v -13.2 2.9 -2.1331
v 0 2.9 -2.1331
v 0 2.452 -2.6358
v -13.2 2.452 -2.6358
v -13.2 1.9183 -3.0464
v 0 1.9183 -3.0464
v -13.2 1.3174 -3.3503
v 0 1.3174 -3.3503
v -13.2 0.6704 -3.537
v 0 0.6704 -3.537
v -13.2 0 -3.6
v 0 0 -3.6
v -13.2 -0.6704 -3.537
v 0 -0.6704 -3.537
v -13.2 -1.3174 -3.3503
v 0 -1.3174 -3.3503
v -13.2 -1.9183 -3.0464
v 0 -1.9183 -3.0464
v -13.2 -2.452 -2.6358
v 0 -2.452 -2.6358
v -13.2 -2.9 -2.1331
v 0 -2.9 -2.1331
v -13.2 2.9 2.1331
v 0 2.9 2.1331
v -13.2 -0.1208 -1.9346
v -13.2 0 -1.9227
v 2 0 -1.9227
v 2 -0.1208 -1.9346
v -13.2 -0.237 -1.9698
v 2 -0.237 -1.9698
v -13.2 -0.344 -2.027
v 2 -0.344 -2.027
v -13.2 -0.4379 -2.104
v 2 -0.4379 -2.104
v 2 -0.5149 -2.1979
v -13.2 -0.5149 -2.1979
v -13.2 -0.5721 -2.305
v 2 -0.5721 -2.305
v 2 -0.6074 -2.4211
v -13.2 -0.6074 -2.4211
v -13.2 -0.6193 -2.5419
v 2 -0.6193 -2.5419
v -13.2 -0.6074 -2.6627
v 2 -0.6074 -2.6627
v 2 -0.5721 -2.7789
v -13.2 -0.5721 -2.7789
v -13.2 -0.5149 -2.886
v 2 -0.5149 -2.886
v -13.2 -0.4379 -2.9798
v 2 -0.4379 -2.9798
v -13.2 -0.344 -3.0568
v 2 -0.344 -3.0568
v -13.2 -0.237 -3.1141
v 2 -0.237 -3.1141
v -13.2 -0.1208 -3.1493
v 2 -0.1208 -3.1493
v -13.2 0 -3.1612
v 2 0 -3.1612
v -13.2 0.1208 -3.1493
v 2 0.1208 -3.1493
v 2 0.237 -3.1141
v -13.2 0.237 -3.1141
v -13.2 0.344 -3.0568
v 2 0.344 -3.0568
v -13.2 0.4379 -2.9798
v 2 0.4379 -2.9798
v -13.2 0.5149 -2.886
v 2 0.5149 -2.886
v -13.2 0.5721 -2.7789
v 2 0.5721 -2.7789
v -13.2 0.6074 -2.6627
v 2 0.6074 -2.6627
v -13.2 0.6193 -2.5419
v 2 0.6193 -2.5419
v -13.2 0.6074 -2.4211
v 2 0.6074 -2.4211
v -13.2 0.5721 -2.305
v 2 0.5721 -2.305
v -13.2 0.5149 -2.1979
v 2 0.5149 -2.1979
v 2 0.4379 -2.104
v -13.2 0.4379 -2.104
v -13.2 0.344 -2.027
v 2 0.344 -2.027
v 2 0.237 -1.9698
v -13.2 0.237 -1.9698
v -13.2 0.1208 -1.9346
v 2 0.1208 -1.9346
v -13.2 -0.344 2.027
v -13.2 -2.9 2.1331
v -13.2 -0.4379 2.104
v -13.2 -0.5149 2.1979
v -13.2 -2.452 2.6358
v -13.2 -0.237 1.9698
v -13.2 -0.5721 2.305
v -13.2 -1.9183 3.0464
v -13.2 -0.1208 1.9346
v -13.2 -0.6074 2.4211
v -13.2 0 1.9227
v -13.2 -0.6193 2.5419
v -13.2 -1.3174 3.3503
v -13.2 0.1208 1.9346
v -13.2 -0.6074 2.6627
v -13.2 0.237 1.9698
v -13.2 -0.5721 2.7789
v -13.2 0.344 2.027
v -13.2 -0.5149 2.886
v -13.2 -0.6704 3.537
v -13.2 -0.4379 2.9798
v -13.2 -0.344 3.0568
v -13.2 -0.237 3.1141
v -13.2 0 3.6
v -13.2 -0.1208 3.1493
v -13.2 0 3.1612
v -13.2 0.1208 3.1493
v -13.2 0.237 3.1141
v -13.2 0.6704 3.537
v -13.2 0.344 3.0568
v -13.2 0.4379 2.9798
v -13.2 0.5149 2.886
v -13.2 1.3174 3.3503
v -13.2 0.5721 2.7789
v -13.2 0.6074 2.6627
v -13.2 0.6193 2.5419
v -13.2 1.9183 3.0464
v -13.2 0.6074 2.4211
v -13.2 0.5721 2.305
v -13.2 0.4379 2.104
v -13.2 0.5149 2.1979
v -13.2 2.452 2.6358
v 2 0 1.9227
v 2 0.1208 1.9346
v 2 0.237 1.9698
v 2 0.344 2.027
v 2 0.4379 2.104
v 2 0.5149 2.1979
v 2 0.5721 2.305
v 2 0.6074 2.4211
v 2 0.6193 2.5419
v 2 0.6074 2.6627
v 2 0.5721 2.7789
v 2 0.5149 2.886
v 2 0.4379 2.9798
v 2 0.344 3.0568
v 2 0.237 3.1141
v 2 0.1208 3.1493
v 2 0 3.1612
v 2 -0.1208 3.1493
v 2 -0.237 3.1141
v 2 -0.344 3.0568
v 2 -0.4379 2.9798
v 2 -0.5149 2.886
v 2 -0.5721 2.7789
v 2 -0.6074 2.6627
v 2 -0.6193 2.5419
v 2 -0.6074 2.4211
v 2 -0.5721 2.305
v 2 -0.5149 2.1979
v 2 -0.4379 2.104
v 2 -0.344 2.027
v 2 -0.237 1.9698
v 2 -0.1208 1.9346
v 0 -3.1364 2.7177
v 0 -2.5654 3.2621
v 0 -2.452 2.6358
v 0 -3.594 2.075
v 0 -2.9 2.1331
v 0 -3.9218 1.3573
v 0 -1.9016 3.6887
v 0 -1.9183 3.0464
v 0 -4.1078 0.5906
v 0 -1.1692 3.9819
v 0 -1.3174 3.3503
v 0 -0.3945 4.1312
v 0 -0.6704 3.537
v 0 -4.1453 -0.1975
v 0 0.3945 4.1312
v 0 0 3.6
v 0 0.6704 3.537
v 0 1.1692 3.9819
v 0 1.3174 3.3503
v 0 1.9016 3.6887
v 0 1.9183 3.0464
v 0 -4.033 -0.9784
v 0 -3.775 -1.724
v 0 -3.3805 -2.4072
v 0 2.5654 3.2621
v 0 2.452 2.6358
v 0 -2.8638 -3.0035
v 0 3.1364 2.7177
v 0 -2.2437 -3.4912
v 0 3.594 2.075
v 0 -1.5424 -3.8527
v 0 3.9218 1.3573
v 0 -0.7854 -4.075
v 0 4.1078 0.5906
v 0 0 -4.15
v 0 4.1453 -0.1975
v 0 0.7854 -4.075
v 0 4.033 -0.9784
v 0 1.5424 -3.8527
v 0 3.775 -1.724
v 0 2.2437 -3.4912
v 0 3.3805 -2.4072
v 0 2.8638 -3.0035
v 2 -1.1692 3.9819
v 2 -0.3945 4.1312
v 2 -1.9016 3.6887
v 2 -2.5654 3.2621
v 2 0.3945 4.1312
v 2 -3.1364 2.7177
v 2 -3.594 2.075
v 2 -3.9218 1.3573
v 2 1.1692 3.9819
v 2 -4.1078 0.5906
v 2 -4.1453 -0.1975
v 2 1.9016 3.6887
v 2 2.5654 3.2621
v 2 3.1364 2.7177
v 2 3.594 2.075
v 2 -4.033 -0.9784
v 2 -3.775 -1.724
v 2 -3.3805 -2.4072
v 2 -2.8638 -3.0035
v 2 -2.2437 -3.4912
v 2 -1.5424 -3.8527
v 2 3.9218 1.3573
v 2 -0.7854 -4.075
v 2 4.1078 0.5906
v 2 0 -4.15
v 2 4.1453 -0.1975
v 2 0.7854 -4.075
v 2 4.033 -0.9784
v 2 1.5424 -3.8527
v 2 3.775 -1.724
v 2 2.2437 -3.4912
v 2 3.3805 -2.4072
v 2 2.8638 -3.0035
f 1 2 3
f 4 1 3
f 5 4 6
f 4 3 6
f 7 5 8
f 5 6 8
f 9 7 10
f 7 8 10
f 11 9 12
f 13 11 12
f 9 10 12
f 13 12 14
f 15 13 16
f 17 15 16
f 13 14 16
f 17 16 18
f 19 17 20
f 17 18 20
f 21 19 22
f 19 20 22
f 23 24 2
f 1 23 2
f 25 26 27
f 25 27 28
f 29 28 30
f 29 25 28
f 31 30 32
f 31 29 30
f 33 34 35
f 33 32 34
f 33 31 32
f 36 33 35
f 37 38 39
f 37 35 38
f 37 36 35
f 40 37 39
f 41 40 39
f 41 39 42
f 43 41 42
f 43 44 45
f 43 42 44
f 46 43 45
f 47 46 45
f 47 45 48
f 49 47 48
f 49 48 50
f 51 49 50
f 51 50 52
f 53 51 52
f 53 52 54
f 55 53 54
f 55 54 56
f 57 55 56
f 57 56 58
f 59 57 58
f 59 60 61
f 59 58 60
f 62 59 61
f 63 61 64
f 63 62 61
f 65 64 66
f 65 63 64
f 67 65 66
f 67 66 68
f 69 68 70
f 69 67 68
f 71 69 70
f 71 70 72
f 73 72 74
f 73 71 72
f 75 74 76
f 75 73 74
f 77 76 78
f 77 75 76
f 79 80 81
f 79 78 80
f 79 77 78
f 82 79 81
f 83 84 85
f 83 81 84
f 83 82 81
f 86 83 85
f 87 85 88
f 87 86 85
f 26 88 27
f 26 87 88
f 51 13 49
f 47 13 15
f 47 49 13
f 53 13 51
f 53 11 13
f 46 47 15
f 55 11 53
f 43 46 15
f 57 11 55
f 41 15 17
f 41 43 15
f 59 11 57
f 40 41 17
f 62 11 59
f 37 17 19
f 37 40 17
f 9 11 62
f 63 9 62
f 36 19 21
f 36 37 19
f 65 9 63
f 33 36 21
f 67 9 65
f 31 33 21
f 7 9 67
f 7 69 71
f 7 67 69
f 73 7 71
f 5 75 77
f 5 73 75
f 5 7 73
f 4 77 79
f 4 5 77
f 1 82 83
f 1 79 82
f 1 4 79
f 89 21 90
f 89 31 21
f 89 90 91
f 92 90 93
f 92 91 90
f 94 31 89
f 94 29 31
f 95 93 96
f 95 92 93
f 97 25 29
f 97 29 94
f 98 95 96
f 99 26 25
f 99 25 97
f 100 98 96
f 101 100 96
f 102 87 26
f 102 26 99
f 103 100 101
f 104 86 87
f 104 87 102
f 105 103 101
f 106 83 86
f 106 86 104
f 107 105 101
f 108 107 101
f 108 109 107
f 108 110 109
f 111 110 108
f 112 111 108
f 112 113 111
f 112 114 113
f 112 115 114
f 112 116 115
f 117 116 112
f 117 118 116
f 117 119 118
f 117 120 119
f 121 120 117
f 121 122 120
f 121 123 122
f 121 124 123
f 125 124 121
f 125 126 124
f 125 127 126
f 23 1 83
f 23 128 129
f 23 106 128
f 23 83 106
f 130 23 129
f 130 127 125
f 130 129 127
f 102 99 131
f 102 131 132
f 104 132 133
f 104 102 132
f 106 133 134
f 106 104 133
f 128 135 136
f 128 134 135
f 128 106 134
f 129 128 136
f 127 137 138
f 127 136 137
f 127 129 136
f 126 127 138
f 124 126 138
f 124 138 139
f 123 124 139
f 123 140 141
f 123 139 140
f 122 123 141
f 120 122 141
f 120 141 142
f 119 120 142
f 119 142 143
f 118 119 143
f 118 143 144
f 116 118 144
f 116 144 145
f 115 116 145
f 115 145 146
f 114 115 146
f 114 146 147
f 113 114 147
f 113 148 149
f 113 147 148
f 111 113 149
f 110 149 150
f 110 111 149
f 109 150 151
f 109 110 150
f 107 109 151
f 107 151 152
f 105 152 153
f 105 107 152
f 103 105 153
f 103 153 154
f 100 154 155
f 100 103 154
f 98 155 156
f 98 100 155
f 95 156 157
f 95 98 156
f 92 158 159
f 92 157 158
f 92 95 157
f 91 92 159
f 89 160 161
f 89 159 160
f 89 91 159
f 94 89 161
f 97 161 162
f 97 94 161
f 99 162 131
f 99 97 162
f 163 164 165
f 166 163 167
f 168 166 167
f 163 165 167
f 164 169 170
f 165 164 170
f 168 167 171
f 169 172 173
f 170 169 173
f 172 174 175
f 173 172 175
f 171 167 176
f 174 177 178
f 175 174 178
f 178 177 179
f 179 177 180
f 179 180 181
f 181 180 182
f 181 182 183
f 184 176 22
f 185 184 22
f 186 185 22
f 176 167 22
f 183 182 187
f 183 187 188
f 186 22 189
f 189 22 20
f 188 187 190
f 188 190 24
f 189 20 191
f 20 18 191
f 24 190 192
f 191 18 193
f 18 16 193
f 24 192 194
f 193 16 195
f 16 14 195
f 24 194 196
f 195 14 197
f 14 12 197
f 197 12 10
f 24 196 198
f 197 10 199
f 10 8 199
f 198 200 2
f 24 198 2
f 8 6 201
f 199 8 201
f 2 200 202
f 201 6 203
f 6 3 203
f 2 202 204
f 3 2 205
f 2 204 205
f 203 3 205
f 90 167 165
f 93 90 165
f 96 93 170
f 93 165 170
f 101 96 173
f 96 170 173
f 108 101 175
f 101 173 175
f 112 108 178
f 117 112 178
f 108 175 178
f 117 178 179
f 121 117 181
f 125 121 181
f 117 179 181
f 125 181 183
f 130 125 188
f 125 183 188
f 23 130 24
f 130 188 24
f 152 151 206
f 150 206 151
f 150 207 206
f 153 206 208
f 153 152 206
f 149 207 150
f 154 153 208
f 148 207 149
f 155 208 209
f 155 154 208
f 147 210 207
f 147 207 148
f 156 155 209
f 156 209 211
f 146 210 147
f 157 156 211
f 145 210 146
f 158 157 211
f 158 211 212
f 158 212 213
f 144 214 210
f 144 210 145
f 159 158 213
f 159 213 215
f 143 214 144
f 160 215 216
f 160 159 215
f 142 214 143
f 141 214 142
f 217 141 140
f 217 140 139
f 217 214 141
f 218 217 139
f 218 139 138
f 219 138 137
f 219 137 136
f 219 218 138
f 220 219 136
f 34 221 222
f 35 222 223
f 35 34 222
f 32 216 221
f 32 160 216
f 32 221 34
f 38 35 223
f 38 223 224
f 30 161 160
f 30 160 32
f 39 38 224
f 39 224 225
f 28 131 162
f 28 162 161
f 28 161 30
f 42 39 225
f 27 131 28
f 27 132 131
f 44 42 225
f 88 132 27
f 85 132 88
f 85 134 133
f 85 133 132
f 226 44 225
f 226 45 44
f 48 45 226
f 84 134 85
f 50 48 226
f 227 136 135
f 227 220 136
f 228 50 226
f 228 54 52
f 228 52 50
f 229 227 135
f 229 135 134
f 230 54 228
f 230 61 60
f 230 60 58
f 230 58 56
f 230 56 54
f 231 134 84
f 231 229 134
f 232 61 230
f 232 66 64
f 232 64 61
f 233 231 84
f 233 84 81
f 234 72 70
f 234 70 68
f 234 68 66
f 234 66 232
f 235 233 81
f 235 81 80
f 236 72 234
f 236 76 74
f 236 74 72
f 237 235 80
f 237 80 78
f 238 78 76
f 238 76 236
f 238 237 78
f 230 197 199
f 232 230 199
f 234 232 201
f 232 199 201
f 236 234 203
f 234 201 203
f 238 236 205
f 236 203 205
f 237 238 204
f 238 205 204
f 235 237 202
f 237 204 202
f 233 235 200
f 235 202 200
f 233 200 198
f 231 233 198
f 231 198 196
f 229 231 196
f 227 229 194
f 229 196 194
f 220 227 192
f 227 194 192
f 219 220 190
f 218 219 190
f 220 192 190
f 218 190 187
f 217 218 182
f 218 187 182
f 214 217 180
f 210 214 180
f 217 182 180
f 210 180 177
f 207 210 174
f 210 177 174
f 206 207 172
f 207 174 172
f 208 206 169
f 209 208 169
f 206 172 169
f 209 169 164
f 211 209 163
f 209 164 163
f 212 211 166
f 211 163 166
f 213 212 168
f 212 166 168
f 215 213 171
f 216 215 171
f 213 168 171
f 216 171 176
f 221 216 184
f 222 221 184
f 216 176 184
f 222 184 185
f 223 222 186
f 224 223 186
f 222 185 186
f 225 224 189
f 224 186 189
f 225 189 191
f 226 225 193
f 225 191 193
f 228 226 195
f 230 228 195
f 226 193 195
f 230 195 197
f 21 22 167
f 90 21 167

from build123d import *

# Parameters (mm, degrees)
SKETCH_1_R               = 4.15
EXTRUDE_1_DEPTH          = 2
EXTRUDE_2_DEPTH          = 13.2
CUT_EXTRUDE_1_DEPTH      = 15.445933684
CUT_EXTRUDE_1_DEPTH_BACK = 15.445933684
SKETCH_3_R               = 0.619261525


with BuildPart() as part:
    # Эскиз1 → Бобышка-Вытянуть1 (new body)
    with BuildSketch(Plane(origin=(0, 0, 0), x_dir=(0, 0, -1), z_dir=(1, 0, 0))):
        Circle(SKETCH_1_R)
    extrude(amount=EXTRUDE_1_DEPTH)

    # Эскиз2 → Бобышка-Вытянуть2 (add)
    with BuildSketch(Plane.ZY):
        with BuildLine():
            Line((2.133072901, 2.9), (-2.133072901, 2.9))
            ThreePointArc((-2.133072901, 2.9), (-3.6, 0), (-2.133072901, -2.9))
            Line((-2.133072901, -2.9), (2.133072901, -2.9))
            ThreePointArc((2.133072901, -2.9), (3.6, 0), (2.133072901, 2.9))
        make_face()
    extrude(amount=EXTRUDE_2_DEPTH)

    # Эскиз3 → Вырез-Вытянуть1 (cut, two sides: drawn at the far end of the back side and taken through both)
    with BuildSketch(Plane(origin=(0, 0, 0), x_dir=(0, 0, -1), z_dir=(1, 0, 0)).offset(-CUT_EXTRUDE_1_DEPTH_BACK)):
        with Locations((-2.541933221, 0)):
            Circle(SKETCH_3_R)
        with Locations(Location((2.541933221, 0, 0), (0, 0, 180))):
            Circle(SKETCH_3_R)
    extrude(amount=CUT_EXTRUDE_1_DEPTH + CUT_EXTRUDE_1_DEPTH_BACK, mode=Mode.SUBTRACT)


solid = part.part
